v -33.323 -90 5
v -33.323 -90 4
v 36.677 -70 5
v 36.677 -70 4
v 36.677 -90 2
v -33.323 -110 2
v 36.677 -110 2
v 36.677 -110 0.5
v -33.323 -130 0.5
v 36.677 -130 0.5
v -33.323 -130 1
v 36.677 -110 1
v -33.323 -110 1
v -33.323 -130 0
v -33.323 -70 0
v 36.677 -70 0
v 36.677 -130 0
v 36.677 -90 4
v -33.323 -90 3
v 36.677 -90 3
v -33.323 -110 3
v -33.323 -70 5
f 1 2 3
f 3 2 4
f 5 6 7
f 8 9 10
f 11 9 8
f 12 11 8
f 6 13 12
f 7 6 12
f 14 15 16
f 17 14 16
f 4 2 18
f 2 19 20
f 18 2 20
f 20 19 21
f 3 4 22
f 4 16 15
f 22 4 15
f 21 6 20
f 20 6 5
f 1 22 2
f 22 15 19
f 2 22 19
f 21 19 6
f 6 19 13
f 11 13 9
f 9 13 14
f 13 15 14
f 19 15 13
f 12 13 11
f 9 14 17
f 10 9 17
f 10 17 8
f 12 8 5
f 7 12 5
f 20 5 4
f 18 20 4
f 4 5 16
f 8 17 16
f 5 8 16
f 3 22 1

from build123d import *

# Parameters (mm, degrees)
F1_DEPTH = 0.5
F2_DEPTH = 1
F3_DEPTH = 2
F4_DEPTH = 3
F5_DEPTH = 4
F6_DEPTH = 5


with BuildPart() as f1:
    # F0 (on Top) → F1 (new body)
    with BuildSketch(Plane.XY):
        Polygon((36.676646, -130), (36.676646, -110), (-33.323354, -130), align=None)
    extrude(amount=F1_DEPTH)

    # F0 (on Top) → F2 (join)
    with BuildSketch(Plane.XY):
        Polygon((36.676646, -110), (-33.323354, -110), (-33.323354, -130), align=None)
    extrude(amount=F2_DEPTH)

    # F0 (on Top) → F3 (join)
    with BuildSketch(Plane.XY):
        Polygon((36.676646, -110), (36.676646, -90), (-33.323354, -110), align=None)
    extrude(amount=F3_DEPTH)

    # F0 (on Top) → F4 (join)
    with BuildSketch(Plane.XY):
        Polygon((36.676646, -90), (-33.323354, -90), (-33.323354, -110), align=None)
    extrude(amount=F4_DEPTH)

    # F0 (on Top) → F5 (join)
    with BuildSketch(Plane.XY):
        Polygon((36.676646, -90), (36.676646, -70), (-33.323354, -90), align=None)
    extrude(amount=F5_DEPTH)

    # F0 (on Top) → F6 (join)
    with BuildSketch(Plane.XY):
        Polygon((36.676646, -70), (-33.323354, -70), (-33.323354, -90), align=None)
    extrude(amount=F6_DEPTH)


solid = f1.part
